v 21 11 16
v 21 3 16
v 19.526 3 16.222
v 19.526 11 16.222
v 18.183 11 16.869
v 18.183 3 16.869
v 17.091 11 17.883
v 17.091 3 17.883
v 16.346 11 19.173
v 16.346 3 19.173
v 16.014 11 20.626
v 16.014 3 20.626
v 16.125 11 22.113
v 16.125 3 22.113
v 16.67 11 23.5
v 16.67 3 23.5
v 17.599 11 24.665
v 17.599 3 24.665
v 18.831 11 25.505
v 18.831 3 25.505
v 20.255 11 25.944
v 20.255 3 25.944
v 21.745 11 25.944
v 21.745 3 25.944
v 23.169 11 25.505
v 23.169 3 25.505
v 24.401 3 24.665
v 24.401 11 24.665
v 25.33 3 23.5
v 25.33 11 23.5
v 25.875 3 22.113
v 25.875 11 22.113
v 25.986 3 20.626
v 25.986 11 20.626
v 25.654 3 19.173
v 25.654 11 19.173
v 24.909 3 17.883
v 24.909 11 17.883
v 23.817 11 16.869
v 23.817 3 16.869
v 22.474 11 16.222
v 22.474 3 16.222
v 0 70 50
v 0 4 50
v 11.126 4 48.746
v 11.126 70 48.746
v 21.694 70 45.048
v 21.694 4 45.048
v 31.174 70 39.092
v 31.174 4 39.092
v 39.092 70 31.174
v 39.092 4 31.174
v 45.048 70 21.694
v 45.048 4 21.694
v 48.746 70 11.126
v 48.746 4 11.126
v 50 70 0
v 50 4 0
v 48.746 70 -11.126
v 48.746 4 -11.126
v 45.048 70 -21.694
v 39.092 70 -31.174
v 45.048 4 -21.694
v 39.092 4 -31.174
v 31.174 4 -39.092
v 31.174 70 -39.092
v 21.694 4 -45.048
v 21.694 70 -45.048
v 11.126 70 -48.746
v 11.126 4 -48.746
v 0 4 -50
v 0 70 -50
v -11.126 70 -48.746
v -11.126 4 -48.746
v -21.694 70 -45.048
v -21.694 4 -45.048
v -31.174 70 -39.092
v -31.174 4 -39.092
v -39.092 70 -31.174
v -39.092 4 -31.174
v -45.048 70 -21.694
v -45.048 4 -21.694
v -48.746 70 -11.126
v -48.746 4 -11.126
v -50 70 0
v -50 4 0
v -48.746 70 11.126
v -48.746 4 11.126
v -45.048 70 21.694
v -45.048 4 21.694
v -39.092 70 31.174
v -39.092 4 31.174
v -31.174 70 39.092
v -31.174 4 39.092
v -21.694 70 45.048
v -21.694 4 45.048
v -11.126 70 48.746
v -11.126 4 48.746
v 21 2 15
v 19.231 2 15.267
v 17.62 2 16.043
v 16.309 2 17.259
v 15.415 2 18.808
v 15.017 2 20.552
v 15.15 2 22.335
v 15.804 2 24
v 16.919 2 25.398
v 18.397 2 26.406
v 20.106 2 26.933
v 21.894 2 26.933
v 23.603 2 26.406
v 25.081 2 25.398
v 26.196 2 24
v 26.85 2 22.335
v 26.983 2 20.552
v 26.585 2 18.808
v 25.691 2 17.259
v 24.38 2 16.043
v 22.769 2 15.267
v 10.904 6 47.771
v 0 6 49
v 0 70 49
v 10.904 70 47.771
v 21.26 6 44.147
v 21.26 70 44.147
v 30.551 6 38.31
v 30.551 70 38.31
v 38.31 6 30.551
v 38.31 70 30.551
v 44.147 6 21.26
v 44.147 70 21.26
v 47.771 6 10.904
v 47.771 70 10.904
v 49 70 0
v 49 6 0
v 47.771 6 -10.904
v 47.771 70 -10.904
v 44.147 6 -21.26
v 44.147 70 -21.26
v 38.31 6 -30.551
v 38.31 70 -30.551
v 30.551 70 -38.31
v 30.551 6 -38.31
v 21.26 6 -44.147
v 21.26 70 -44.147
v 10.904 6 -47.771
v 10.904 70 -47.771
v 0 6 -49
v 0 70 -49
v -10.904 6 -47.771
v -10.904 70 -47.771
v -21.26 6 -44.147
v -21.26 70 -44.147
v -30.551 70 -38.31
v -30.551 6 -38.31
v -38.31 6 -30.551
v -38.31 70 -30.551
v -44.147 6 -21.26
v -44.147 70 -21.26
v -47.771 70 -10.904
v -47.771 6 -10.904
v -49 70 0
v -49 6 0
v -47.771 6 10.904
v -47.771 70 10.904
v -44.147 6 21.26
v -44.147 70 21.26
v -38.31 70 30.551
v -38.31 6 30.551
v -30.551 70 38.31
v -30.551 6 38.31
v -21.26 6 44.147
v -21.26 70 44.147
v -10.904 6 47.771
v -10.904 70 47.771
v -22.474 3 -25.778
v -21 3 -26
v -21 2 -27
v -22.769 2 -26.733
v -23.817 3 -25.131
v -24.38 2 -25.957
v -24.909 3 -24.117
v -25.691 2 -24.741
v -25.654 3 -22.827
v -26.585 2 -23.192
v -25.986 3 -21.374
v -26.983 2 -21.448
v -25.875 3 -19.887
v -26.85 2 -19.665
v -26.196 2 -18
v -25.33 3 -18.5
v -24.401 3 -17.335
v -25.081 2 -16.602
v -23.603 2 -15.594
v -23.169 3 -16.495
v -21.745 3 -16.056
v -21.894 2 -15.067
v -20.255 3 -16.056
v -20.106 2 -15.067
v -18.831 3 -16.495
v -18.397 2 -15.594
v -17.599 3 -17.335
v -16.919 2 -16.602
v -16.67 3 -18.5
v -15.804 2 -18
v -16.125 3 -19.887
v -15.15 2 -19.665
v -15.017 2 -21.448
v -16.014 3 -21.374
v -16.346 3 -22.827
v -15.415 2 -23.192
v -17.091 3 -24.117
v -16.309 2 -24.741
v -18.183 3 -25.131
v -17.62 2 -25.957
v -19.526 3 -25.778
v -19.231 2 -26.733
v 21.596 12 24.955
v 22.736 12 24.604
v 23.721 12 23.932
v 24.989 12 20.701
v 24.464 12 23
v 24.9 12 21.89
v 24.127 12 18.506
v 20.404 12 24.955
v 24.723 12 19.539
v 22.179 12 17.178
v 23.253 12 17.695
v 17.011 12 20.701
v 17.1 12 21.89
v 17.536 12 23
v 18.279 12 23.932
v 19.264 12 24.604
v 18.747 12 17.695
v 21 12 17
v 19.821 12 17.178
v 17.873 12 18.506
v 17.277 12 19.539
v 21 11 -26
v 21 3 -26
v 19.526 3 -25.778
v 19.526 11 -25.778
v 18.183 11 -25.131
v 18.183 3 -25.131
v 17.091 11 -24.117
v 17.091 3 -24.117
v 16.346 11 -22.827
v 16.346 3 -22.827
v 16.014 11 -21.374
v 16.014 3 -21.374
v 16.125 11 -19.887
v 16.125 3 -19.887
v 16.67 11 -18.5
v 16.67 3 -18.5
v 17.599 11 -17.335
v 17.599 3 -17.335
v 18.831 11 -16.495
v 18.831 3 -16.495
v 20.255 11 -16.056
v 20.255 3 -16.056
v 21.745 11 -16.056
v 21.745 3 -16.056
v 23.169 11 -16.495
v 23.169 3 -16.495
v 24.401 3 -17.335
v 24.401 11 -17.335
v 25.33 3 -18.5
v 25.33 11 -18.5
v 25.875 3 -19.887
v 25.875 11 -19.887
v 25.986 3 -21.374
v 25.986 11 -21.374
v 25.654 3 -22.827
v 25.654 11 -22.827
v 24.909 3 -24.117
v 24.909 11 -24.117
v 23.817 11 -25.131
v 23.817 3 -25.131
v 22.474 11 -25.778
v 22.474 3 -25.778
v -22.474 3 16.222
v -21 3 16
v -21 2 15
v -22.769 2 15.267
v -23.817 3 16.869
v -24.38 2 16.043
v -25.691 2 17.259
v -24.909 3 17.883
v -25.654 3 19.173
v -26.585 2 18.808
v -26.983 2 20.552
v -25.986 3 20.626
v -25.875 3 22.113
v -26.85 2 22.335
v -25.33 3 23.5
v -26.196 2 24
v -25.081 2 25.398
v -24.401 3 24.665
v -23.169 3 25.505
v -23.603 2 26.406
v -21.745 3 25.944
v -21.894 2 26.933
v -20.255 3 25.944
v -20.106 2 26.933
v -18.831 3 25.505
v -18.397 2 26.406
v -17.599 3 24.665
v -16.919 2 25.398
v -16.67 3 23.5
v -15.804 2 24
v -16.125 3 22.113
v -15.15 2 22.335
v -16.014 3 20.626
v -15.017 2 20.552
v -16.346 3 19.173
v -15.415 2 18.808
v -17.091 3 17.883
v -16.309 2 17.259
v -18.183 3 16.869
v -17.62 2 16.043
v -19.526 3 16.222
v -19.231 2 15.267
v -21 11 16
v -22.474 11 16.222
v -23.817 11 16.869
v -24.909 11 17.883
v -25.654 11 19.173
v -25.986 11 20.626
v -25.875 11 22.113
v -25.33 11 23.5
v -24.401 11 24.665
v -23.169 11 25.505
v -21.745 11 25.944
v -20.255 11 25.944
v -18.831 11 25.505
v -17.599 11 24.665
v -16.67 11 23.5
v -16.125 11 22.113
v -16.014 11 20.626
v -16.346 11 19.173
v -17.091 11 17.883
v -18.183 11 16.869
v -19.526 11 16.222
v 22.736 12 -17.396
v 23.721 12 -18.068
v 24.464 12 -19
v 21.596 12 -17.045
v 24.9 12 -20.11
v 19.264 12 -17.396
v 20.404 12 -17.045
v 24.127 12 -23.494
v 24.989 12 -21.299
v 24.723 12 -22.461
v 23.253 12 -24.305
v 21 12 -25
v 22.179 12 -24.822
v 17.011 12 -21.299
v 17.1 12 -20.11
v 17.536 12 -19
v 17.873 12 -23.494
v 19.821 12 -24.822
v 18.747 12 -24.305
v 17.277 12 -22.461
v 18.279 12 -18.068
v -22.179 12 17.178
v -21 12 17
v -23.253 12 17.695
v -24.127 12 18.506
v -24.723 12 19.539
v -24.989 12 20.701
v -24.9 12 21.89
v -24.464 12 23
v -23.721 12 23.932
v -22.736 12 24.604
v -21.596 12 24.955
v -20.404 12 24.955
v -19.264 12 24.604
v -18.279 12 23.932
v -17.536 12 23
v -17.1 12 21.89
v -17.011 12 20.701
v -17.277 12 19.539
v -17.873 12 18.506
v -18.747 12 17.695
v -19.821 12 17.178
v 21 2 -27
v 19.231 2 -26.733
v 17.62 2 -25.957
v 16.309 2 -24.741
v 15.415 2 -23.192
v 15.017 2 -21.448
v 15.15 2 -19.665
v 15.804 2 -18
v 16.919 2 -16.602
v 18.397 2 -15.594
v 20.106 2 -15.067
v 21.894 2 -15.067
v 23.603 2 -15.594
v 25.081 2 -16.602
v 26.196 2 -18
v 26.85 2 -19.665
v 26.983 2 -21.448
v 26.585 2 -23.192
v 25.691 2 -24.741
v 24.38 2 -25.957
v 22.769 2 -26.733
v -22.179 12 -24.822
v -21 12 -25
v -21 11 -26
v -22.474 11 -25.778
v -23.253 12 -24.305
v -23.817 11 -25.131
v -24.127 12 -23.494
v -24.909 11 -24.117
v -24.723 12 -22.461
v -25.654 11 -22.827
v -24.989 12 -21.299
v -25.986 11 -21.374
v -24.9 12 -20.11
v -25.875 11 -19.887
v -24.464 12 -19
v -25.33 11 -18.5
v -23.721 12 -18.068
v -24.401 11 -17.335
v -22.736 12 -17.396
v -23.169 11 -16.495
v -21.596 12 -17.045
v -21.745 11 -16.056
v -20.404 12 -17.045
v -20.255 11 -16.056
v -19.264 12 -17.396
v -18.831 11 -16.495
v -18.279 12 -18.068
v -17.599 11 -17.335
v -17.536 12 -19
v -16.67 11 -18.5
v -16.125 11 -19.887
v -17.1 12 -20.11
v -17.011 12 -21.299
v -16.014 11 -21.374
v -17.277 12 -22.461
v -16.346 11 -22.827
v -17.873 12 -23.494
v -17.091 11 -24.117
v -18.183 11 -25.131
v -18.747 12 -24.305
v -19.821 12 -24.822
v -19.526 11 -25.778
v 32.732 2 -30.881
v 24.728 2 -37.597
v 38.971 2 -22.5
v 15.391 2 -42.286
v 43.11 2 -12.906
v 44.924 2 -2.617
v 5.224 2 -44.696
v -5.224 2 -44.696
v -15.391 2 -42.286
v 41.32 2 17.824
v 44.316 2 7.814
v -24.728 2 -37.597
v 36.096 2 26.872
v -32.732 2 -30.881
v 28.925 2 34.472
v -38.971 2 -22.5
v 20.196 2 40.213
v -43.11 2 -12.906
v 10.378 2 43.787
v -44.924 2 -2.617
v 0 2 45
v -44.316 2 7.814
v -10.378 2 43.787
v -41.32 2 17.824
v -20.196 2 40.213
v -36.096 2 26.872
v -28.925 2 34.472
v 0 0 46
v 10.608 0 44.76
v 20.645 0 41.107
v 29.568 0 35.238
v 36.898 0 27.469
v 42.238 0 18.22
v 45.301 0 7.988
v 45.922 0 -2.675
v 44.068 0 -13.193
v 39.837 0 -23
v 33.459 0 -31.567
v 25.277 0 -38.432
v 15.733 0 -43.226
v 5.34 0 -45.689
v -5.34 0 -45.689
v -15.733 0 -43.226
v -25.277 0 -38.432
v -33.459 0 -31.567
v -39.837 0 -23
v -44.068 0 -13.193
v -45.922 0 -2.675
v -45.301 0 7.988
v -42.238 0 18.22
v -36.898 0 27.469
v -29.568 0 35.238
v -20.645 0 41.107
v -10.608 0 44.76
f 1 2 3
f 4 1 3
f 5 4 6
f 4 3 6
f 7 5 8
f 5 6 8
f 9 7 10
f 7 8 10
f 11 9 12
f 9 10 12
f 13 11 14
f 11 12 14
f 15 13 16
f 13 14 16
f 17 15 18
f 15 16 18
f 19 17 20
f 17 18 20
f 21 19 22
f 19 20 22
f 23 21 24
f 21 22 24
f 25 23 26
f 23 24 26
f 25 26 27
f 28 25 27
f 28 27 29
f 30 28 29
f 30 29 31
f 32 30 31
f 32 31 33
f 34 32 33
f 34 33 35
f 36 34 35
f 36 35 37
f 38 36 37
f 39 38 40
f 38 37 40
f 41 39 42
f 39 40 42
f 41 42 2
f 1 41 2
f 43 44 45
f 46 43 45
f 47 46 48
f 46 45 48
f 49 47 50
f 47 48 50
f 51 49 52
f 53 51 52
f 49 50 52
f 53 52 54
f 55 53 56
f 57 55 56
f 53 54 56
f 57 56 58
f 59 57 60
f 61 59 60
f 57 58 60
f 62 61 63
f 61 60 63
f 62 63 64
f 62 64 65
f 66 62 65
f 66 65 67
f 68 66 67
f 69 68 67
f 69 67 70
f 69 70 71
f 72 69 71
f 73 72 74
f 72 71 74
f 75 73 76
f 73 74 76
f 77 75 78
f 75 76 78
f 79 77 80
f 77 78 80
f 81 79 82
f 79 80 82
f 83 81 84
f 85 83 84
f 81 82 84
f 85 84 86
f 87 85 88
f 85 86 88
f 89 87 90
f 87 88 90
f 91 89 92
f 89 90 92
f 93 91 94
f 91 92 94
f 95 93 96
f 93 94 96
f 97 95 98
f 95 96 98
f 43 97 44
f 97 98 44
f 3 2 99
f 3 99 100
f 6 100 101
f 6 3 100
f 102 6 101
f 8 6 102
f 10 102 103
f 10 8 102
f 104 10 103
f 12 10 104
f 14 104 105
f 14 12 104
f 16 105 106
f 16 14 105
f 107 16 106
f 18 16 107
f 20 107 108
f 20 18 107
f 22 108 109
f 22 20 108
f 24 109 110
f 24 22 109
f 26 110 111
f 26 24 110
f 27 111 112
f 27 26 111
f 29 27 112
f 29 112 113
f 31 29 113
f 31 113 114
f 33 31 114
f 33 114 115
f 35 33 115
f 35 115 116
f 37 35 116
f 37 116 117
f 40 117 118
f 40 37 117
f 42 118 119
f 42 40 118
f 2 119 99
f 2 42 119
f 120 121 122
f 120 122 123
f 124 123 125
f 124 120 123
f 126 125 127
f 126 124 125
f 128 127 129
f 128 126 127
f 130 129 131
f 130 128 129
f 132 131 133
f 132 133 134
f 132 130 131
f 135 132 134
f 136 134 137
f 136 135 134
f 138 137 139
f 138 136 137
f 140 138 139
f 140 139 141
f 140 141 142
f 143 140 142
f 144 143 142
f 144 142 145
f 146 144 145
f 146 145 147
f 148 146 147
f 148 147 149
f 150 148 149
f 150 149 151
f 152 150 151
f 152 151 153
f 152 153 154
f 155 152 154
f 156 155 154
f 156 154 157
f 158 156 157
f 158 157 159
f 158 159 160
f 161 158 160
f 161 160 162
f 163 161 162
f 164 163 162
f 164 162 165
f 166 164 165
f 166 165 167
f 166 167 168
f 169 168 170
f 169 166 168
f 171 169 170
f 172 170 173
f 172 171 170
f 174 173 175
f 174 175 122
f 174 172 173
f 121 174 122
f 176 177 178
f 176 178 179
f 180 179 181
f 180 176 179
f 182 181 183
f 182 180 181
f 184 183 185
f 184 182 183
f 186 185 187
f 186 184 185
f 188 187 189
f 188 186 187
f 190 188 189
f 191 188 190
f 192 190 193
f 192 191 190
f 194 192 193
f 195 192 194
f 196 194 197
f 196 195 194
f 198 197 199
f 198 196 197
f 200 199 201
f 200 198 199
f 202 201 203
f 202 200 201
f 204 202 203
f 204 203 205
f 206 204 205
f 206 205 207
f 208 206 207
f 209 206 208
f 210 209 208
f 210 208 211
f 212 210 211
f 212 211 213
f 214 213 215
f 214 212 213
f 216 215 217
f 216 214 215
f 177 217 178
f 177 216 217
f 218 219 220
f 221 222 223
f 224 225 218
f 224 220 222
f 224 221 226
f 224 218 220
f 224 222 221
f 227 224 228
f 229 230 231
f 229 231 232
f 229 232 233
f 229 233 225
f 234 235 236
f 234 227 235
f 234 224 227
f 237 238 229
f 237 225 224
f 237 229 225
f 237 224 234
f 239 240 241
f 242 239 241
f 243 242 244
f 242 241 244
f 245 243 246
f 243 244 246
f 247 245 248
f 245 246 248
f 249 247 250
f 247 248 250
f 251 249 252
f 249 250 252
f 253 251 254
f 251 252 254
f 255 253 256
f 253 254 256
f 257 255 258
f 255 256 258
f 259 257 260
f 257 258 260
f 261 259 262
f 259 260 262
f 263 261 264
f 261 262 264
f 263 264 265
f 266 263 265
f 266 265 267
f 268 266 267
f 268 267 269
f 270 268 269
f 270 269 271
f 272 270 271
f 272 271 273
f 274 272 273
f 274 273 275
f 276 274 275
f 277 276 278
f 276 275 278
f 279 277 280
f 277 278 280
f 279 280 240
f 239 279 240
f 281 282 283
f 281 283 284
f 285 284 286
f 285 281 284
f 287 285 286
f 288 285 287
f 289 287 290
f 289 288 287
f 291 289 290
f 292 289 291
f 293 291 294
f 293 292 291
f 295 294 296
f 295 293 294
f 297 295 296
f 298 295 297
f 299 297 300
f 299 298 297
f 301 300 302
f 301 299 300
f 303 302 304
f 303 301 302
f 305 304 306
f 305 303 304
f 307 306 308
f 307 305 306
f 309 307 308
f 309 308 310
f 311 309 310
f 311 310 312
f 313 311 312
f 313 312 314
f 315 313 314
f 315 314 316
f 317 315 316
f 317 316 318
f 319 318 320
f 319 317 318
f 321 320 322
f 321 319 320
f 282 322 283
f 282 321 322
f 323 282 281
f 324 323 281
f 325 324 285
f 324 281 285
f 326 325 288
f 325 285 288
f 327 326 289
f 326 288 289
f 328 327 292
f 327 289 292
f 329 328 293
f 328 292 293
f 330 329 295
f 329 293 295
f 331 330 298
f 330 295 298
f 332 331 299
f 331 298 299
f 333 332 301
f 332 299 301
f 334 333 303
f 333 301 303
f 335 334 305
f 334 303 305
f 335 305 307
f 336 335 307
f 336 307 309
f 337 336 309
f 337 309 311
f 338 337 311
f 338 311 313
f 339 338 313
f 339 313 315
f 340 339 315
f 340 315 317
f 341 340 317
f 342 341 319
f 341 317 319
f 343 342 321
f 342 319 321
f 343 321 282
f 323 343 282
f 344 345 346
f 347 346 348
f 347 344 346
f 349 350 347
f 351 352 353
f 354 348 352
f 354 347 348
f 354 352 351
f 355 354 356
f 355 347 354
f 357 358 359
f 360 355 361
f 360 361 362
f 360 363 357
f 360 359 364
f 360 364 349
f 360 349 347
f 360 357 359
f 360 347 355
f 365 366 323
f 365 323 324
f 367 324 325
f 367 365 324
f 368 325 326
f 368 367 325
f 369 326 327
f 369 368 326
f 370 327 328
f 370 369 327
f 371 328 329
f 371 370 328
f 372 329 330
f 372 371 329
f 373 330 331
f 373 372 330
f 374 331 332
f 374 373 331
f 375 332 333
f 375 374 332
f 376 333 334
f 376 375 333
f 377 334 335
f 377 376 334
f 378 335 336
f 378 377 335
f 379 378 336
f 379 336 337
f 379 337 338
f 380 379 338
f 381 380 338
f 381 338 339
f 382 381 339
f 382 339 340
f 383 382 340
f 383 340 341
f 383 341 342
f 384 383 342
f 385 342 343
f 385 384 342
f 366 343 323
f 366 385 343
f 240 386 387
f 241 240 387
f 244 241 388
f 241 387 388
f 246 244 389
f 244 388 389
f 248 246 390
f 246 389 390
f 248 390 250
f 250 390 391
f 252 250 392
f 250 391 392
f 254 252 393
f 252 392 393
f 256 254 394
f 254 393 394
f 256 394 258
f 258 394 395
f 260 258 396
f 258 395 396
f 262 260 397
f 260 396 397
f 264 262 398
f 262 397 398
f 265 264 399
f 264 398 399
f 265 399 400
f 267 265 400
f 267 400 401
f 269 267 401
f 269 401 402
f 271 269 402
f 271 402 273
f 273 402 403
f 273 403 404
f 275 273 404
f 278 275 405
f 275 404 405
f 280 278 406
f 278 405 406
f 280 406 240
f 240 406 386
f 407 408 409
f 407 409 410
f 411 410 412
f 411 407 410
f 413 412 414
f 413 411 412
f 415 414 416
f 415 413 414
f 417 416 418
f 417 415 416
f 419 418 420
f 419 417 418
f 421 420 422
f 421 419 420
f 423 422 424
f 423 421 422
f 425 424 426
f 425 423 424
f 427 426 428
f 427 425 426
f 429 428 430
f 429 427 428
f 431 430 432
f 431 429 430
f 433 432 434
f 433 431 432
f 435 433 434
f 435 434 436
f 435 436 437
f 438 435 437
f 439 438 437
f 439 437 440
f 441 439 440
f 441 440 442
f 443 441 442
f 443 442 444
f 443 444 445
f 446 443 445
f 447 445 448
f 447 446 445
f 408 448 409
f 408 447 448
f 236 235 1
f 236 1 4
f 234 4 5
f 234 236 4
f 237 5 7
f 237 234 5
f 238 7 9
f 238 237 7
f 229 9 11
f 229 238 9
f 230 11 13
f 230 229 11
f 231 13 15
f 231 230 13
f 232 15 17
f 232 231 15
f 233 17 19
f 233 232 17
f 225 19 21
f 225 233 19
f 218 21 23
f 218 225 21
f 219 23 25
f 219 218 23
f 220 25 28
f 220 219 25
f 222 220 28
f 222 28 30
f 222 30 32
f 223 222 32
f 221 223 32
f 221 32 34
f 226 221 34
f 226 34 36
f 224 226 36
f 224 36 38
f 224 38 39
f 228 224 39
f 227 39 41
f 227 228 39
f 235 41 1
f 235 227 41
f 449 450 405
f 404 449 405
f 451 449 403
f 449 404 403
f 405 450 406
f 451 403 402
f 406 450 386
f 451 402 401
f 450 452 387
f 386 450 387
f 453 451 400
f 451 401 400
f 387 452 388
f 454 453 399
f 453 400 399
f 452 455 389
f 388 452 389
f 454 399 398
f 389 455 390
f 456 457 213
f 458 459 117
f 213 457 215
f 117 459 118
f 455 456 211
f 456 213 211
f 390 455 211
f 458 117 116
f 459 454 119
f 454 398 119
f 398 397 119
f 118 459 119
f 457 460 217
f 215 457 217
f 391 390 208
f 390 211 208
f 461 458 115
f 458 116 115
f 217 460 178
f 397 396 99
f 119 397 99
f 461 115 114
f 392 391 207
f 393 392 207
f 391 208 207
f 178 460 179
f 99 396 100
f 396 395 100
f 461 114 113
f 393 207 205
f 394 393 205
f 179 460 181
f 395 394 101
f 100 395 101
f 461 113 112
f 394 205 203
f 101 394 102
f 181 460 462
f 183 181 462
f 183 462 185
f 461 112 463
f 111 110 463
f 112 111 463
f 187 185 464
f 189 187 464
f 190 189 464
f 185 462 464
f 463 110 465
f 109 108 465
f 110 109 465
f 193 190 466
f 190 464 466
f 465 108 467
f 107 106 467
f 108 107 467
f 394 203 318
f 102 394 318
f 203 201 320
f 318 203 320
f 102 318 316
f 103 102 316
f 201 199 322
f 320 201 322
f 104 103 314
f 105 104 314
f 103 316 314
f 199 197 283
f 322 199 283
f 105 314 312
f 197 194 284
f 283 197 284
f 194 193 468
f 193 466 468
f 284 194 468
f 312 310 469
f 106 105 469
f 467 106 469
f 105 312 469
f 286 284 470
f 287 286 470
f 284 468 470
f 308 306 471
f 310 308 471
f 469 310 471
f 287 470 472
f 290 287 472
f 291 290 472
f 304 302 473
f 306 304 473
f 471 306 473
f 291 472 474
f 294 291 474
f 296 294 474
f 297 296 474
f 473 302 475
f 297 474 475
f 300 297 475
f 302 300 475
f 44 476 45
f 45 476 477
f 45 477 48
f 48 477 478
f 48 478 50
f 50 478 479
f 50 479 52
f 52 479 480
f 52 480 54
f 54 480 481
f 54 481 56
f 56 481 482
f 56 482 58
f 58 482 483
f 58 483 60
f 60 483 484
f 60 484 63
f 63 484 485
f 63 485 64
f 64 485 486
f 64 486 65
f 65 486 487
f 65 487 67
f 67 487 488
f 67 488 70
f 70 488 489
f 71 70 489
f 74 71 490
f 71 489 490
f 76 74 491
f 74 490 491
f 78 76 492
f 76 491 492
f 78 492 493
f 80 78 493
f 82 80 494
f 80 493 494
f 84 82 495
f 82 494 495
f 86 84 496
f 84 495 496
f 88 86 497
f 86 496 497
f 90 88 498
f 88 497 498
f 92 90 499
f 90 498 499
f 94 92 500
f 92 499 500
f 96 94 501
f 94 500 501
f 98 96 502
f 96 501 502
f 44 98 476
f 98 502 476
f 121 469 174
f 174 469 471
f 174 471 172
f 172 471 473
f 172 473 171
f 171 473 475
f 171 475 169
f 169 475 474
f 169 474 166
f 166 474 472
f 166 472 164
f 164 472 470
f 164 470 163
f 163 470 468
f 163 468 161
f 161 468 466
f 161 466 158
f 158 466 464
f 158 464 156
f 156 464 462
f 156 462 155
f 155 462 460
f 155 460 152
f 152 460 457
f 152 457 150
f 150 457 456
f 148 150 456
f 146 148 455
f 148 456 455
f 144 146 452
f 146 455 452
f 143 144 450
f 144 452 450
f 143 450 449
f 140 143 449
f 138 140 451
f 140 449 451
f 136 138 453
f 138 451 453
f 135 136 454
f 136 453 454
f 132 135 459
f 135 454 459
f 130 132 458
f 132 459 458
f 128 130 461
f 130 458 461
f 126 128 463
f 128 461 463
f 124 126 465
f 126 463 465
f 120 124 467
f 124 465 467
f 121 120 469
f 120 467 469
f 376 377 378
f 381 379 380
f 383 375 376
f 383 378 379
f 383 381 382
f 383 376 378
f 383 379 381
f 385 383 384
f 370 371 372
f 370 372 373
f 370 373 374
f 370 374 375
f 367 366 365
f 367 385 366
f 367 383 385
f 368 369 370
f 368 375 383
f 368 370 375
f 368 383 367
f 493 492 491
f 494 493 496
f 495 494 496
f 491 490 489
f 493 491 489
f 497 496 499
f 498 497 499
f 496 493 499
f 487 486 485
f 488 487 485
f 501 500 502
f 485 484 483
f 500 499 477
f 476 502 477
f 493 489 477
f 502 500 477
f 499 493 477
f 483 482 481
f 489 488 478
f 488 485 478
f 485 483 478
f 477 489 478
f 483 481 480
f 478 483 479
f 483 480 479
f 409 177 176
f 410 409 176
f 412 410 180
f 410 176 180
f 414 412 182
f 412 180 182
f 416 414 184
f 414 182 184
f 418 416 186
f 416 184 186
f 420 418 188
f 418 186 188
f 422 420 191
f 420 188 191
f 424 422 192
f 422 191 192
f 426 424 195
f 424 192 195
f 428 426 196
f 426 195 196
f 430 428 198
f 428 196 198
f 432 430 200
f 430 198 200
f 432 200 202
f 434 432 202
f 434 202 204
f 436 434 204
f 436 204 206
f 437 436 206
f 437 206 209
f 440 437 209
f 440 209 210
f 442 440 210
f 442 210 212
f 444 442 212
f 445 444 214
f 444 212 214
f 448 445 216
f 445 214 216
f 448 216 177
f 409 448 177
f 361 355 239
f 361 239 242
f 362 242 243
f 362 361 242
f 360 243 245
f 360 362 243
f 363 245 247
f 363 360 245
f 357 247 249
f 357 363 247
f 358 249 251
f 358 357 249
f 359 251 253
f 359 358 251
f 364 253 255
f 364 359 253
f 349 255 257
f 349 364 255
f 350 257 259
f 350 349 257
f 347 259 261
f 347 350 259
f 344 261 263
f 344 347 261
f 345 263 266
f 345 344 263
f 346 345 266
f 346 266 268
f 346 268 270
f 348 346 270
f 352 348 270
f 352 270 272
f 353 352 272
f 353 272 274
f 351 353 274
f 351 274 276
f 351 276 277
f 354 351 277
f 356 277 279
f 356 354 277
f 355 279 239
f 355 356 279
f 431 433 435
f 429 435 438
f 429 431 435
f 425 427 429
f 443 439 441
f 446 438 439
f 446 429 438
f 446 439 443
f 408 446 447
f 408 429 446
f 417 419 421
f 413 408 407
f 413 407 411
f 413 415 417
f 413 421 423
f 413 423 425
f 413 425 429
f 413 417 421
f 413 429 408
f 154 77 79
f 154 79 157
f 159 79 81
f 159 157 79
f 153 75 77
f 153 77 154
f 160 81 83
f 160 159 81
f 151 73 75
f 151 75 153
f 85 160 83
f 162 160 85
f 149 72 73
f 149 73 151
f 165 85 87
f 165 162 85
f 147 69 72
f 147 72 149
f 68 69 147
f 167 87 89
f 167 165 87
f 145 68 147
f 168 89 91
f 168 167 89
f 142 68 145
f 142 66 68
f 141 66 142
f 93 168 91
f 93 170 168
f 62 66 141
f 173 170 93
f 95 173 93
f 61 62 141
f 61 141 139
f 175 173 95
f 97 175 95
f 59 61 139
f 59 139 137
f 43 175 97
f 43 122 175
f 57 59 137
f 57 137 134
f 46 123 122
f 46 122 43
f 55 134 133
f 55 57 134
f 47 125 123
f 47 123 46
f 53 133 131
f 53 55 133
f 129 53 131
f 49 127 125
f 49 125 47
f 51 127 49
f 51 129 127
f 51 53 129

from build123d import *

# Parameters (mm, degrees)
SKETCH1_R                = 50
SKETCH1_R_2              = 49
MAIN_WALL_DEPTH          = 70
SKETCH2_R                = 50
FLOOR_2_DEPTH            = 2
INNER_FLOOR_CHAMFER_SIZE = 4
OUTER_FLOOR_CHAMFER_SIZE = 4
SKETCH3_R                = 5
CONNECTOR_PEG_DEPTH      = 10
PEG_CHAMFER_SIZE         = 1
CHAMFER1_SIZE            = 1


with BuildPart() as part:
    # Sketch1 → Main Wall (new body)
    with BuildSketch(Plane(origin=(0, 0, 0), x_dir=(1, 0, 0), z_dir=(0, 1, 0))):
        with Locations(Location((0, 0, 0), (0, 0, 270))):
            Circle(SKETCH1_R)
        with Locations(Location((0, 0, 0), (0, 0, 270))):
            Circle(SKETCH1_R_2, mode=Mode.SUBTRACT)
    extrude(amount=MAIN_WALL_DEPTH)

    # Sketch2 → Floor 2 (add)
    with BuildSketch(Plane.XZ):
        with Locations(Location((0, 0, 0), (0, 0, 90))):
            Circle(SKETCH2_R)
    extrude(amount=-FLOOR_2_DEPTH)

    # Inner Floor Chamfer
    inner_floor_chamfer_edges = [part.edges().sort_by_distance(p)[0] for p in [
        (0, 2, -49),
    ]]
    chamfer(inner_floor_chamfer_edges, length=INNER_FLOOR_CHAMFER_SIZE)

    # Outer Floor Chamfer
    outer_floor_chamfer_edges = [part.edges().sort_by_distance(p)[0] for p in [
        (0, 0, -50),
    ]]
    chamfer(outer_floor_chamfer_edges, length=OUTER_FLOOR_CHAMFER_SIZE)

    # Sketch3 → Connector Peg (add)
    with BuildSketch(Plane(origin=(0, 2, 0), x_dir=(1, 0, 0), z_dir=(0, 1, 0))):
        with Locations(Location((-21, 21, 0), (0, 0, 90))):
            Circle(SKETCH3_R)
        with Locations(Location((21, 21, 0), (0, 0, 90))):
            Circle(SKETCH3_R)
        with Locations(Location((21, -21, 0), (0, 0, 90))):
            Circle(SKETCH3_R)
        with Locations(Location((-21, -21, 0), (0, 0, 90))):
            Circle(SKETCH3_R)
    extrude(amount=CONNECTOR_PEG_DEPTH)

    # Peg Chamfer
    peg_chamfer_edges = [part.edges().sort_by_distance(p)[0] for p in [
        (-21, 12, -16),
        (21, 12, -16),
        (21, 12, 26),
        (-21, 12, 26),
    ]]
    chamfer(peg_chamfer_edges, length=PEG_CHAMFER_SIZE)

    # Chamfer1
    chamfer1_edges = [part.edges().sort_by_distance(p)[0] for p in [
        (-21, 2, -16),
        (21, 2, -16),
        (21, 2, 26),
        (-21, 2, 26),
    ]]
    chamfer(chamfer1_edges, length=CHAMFER1_SIZE)


solid = part.part
